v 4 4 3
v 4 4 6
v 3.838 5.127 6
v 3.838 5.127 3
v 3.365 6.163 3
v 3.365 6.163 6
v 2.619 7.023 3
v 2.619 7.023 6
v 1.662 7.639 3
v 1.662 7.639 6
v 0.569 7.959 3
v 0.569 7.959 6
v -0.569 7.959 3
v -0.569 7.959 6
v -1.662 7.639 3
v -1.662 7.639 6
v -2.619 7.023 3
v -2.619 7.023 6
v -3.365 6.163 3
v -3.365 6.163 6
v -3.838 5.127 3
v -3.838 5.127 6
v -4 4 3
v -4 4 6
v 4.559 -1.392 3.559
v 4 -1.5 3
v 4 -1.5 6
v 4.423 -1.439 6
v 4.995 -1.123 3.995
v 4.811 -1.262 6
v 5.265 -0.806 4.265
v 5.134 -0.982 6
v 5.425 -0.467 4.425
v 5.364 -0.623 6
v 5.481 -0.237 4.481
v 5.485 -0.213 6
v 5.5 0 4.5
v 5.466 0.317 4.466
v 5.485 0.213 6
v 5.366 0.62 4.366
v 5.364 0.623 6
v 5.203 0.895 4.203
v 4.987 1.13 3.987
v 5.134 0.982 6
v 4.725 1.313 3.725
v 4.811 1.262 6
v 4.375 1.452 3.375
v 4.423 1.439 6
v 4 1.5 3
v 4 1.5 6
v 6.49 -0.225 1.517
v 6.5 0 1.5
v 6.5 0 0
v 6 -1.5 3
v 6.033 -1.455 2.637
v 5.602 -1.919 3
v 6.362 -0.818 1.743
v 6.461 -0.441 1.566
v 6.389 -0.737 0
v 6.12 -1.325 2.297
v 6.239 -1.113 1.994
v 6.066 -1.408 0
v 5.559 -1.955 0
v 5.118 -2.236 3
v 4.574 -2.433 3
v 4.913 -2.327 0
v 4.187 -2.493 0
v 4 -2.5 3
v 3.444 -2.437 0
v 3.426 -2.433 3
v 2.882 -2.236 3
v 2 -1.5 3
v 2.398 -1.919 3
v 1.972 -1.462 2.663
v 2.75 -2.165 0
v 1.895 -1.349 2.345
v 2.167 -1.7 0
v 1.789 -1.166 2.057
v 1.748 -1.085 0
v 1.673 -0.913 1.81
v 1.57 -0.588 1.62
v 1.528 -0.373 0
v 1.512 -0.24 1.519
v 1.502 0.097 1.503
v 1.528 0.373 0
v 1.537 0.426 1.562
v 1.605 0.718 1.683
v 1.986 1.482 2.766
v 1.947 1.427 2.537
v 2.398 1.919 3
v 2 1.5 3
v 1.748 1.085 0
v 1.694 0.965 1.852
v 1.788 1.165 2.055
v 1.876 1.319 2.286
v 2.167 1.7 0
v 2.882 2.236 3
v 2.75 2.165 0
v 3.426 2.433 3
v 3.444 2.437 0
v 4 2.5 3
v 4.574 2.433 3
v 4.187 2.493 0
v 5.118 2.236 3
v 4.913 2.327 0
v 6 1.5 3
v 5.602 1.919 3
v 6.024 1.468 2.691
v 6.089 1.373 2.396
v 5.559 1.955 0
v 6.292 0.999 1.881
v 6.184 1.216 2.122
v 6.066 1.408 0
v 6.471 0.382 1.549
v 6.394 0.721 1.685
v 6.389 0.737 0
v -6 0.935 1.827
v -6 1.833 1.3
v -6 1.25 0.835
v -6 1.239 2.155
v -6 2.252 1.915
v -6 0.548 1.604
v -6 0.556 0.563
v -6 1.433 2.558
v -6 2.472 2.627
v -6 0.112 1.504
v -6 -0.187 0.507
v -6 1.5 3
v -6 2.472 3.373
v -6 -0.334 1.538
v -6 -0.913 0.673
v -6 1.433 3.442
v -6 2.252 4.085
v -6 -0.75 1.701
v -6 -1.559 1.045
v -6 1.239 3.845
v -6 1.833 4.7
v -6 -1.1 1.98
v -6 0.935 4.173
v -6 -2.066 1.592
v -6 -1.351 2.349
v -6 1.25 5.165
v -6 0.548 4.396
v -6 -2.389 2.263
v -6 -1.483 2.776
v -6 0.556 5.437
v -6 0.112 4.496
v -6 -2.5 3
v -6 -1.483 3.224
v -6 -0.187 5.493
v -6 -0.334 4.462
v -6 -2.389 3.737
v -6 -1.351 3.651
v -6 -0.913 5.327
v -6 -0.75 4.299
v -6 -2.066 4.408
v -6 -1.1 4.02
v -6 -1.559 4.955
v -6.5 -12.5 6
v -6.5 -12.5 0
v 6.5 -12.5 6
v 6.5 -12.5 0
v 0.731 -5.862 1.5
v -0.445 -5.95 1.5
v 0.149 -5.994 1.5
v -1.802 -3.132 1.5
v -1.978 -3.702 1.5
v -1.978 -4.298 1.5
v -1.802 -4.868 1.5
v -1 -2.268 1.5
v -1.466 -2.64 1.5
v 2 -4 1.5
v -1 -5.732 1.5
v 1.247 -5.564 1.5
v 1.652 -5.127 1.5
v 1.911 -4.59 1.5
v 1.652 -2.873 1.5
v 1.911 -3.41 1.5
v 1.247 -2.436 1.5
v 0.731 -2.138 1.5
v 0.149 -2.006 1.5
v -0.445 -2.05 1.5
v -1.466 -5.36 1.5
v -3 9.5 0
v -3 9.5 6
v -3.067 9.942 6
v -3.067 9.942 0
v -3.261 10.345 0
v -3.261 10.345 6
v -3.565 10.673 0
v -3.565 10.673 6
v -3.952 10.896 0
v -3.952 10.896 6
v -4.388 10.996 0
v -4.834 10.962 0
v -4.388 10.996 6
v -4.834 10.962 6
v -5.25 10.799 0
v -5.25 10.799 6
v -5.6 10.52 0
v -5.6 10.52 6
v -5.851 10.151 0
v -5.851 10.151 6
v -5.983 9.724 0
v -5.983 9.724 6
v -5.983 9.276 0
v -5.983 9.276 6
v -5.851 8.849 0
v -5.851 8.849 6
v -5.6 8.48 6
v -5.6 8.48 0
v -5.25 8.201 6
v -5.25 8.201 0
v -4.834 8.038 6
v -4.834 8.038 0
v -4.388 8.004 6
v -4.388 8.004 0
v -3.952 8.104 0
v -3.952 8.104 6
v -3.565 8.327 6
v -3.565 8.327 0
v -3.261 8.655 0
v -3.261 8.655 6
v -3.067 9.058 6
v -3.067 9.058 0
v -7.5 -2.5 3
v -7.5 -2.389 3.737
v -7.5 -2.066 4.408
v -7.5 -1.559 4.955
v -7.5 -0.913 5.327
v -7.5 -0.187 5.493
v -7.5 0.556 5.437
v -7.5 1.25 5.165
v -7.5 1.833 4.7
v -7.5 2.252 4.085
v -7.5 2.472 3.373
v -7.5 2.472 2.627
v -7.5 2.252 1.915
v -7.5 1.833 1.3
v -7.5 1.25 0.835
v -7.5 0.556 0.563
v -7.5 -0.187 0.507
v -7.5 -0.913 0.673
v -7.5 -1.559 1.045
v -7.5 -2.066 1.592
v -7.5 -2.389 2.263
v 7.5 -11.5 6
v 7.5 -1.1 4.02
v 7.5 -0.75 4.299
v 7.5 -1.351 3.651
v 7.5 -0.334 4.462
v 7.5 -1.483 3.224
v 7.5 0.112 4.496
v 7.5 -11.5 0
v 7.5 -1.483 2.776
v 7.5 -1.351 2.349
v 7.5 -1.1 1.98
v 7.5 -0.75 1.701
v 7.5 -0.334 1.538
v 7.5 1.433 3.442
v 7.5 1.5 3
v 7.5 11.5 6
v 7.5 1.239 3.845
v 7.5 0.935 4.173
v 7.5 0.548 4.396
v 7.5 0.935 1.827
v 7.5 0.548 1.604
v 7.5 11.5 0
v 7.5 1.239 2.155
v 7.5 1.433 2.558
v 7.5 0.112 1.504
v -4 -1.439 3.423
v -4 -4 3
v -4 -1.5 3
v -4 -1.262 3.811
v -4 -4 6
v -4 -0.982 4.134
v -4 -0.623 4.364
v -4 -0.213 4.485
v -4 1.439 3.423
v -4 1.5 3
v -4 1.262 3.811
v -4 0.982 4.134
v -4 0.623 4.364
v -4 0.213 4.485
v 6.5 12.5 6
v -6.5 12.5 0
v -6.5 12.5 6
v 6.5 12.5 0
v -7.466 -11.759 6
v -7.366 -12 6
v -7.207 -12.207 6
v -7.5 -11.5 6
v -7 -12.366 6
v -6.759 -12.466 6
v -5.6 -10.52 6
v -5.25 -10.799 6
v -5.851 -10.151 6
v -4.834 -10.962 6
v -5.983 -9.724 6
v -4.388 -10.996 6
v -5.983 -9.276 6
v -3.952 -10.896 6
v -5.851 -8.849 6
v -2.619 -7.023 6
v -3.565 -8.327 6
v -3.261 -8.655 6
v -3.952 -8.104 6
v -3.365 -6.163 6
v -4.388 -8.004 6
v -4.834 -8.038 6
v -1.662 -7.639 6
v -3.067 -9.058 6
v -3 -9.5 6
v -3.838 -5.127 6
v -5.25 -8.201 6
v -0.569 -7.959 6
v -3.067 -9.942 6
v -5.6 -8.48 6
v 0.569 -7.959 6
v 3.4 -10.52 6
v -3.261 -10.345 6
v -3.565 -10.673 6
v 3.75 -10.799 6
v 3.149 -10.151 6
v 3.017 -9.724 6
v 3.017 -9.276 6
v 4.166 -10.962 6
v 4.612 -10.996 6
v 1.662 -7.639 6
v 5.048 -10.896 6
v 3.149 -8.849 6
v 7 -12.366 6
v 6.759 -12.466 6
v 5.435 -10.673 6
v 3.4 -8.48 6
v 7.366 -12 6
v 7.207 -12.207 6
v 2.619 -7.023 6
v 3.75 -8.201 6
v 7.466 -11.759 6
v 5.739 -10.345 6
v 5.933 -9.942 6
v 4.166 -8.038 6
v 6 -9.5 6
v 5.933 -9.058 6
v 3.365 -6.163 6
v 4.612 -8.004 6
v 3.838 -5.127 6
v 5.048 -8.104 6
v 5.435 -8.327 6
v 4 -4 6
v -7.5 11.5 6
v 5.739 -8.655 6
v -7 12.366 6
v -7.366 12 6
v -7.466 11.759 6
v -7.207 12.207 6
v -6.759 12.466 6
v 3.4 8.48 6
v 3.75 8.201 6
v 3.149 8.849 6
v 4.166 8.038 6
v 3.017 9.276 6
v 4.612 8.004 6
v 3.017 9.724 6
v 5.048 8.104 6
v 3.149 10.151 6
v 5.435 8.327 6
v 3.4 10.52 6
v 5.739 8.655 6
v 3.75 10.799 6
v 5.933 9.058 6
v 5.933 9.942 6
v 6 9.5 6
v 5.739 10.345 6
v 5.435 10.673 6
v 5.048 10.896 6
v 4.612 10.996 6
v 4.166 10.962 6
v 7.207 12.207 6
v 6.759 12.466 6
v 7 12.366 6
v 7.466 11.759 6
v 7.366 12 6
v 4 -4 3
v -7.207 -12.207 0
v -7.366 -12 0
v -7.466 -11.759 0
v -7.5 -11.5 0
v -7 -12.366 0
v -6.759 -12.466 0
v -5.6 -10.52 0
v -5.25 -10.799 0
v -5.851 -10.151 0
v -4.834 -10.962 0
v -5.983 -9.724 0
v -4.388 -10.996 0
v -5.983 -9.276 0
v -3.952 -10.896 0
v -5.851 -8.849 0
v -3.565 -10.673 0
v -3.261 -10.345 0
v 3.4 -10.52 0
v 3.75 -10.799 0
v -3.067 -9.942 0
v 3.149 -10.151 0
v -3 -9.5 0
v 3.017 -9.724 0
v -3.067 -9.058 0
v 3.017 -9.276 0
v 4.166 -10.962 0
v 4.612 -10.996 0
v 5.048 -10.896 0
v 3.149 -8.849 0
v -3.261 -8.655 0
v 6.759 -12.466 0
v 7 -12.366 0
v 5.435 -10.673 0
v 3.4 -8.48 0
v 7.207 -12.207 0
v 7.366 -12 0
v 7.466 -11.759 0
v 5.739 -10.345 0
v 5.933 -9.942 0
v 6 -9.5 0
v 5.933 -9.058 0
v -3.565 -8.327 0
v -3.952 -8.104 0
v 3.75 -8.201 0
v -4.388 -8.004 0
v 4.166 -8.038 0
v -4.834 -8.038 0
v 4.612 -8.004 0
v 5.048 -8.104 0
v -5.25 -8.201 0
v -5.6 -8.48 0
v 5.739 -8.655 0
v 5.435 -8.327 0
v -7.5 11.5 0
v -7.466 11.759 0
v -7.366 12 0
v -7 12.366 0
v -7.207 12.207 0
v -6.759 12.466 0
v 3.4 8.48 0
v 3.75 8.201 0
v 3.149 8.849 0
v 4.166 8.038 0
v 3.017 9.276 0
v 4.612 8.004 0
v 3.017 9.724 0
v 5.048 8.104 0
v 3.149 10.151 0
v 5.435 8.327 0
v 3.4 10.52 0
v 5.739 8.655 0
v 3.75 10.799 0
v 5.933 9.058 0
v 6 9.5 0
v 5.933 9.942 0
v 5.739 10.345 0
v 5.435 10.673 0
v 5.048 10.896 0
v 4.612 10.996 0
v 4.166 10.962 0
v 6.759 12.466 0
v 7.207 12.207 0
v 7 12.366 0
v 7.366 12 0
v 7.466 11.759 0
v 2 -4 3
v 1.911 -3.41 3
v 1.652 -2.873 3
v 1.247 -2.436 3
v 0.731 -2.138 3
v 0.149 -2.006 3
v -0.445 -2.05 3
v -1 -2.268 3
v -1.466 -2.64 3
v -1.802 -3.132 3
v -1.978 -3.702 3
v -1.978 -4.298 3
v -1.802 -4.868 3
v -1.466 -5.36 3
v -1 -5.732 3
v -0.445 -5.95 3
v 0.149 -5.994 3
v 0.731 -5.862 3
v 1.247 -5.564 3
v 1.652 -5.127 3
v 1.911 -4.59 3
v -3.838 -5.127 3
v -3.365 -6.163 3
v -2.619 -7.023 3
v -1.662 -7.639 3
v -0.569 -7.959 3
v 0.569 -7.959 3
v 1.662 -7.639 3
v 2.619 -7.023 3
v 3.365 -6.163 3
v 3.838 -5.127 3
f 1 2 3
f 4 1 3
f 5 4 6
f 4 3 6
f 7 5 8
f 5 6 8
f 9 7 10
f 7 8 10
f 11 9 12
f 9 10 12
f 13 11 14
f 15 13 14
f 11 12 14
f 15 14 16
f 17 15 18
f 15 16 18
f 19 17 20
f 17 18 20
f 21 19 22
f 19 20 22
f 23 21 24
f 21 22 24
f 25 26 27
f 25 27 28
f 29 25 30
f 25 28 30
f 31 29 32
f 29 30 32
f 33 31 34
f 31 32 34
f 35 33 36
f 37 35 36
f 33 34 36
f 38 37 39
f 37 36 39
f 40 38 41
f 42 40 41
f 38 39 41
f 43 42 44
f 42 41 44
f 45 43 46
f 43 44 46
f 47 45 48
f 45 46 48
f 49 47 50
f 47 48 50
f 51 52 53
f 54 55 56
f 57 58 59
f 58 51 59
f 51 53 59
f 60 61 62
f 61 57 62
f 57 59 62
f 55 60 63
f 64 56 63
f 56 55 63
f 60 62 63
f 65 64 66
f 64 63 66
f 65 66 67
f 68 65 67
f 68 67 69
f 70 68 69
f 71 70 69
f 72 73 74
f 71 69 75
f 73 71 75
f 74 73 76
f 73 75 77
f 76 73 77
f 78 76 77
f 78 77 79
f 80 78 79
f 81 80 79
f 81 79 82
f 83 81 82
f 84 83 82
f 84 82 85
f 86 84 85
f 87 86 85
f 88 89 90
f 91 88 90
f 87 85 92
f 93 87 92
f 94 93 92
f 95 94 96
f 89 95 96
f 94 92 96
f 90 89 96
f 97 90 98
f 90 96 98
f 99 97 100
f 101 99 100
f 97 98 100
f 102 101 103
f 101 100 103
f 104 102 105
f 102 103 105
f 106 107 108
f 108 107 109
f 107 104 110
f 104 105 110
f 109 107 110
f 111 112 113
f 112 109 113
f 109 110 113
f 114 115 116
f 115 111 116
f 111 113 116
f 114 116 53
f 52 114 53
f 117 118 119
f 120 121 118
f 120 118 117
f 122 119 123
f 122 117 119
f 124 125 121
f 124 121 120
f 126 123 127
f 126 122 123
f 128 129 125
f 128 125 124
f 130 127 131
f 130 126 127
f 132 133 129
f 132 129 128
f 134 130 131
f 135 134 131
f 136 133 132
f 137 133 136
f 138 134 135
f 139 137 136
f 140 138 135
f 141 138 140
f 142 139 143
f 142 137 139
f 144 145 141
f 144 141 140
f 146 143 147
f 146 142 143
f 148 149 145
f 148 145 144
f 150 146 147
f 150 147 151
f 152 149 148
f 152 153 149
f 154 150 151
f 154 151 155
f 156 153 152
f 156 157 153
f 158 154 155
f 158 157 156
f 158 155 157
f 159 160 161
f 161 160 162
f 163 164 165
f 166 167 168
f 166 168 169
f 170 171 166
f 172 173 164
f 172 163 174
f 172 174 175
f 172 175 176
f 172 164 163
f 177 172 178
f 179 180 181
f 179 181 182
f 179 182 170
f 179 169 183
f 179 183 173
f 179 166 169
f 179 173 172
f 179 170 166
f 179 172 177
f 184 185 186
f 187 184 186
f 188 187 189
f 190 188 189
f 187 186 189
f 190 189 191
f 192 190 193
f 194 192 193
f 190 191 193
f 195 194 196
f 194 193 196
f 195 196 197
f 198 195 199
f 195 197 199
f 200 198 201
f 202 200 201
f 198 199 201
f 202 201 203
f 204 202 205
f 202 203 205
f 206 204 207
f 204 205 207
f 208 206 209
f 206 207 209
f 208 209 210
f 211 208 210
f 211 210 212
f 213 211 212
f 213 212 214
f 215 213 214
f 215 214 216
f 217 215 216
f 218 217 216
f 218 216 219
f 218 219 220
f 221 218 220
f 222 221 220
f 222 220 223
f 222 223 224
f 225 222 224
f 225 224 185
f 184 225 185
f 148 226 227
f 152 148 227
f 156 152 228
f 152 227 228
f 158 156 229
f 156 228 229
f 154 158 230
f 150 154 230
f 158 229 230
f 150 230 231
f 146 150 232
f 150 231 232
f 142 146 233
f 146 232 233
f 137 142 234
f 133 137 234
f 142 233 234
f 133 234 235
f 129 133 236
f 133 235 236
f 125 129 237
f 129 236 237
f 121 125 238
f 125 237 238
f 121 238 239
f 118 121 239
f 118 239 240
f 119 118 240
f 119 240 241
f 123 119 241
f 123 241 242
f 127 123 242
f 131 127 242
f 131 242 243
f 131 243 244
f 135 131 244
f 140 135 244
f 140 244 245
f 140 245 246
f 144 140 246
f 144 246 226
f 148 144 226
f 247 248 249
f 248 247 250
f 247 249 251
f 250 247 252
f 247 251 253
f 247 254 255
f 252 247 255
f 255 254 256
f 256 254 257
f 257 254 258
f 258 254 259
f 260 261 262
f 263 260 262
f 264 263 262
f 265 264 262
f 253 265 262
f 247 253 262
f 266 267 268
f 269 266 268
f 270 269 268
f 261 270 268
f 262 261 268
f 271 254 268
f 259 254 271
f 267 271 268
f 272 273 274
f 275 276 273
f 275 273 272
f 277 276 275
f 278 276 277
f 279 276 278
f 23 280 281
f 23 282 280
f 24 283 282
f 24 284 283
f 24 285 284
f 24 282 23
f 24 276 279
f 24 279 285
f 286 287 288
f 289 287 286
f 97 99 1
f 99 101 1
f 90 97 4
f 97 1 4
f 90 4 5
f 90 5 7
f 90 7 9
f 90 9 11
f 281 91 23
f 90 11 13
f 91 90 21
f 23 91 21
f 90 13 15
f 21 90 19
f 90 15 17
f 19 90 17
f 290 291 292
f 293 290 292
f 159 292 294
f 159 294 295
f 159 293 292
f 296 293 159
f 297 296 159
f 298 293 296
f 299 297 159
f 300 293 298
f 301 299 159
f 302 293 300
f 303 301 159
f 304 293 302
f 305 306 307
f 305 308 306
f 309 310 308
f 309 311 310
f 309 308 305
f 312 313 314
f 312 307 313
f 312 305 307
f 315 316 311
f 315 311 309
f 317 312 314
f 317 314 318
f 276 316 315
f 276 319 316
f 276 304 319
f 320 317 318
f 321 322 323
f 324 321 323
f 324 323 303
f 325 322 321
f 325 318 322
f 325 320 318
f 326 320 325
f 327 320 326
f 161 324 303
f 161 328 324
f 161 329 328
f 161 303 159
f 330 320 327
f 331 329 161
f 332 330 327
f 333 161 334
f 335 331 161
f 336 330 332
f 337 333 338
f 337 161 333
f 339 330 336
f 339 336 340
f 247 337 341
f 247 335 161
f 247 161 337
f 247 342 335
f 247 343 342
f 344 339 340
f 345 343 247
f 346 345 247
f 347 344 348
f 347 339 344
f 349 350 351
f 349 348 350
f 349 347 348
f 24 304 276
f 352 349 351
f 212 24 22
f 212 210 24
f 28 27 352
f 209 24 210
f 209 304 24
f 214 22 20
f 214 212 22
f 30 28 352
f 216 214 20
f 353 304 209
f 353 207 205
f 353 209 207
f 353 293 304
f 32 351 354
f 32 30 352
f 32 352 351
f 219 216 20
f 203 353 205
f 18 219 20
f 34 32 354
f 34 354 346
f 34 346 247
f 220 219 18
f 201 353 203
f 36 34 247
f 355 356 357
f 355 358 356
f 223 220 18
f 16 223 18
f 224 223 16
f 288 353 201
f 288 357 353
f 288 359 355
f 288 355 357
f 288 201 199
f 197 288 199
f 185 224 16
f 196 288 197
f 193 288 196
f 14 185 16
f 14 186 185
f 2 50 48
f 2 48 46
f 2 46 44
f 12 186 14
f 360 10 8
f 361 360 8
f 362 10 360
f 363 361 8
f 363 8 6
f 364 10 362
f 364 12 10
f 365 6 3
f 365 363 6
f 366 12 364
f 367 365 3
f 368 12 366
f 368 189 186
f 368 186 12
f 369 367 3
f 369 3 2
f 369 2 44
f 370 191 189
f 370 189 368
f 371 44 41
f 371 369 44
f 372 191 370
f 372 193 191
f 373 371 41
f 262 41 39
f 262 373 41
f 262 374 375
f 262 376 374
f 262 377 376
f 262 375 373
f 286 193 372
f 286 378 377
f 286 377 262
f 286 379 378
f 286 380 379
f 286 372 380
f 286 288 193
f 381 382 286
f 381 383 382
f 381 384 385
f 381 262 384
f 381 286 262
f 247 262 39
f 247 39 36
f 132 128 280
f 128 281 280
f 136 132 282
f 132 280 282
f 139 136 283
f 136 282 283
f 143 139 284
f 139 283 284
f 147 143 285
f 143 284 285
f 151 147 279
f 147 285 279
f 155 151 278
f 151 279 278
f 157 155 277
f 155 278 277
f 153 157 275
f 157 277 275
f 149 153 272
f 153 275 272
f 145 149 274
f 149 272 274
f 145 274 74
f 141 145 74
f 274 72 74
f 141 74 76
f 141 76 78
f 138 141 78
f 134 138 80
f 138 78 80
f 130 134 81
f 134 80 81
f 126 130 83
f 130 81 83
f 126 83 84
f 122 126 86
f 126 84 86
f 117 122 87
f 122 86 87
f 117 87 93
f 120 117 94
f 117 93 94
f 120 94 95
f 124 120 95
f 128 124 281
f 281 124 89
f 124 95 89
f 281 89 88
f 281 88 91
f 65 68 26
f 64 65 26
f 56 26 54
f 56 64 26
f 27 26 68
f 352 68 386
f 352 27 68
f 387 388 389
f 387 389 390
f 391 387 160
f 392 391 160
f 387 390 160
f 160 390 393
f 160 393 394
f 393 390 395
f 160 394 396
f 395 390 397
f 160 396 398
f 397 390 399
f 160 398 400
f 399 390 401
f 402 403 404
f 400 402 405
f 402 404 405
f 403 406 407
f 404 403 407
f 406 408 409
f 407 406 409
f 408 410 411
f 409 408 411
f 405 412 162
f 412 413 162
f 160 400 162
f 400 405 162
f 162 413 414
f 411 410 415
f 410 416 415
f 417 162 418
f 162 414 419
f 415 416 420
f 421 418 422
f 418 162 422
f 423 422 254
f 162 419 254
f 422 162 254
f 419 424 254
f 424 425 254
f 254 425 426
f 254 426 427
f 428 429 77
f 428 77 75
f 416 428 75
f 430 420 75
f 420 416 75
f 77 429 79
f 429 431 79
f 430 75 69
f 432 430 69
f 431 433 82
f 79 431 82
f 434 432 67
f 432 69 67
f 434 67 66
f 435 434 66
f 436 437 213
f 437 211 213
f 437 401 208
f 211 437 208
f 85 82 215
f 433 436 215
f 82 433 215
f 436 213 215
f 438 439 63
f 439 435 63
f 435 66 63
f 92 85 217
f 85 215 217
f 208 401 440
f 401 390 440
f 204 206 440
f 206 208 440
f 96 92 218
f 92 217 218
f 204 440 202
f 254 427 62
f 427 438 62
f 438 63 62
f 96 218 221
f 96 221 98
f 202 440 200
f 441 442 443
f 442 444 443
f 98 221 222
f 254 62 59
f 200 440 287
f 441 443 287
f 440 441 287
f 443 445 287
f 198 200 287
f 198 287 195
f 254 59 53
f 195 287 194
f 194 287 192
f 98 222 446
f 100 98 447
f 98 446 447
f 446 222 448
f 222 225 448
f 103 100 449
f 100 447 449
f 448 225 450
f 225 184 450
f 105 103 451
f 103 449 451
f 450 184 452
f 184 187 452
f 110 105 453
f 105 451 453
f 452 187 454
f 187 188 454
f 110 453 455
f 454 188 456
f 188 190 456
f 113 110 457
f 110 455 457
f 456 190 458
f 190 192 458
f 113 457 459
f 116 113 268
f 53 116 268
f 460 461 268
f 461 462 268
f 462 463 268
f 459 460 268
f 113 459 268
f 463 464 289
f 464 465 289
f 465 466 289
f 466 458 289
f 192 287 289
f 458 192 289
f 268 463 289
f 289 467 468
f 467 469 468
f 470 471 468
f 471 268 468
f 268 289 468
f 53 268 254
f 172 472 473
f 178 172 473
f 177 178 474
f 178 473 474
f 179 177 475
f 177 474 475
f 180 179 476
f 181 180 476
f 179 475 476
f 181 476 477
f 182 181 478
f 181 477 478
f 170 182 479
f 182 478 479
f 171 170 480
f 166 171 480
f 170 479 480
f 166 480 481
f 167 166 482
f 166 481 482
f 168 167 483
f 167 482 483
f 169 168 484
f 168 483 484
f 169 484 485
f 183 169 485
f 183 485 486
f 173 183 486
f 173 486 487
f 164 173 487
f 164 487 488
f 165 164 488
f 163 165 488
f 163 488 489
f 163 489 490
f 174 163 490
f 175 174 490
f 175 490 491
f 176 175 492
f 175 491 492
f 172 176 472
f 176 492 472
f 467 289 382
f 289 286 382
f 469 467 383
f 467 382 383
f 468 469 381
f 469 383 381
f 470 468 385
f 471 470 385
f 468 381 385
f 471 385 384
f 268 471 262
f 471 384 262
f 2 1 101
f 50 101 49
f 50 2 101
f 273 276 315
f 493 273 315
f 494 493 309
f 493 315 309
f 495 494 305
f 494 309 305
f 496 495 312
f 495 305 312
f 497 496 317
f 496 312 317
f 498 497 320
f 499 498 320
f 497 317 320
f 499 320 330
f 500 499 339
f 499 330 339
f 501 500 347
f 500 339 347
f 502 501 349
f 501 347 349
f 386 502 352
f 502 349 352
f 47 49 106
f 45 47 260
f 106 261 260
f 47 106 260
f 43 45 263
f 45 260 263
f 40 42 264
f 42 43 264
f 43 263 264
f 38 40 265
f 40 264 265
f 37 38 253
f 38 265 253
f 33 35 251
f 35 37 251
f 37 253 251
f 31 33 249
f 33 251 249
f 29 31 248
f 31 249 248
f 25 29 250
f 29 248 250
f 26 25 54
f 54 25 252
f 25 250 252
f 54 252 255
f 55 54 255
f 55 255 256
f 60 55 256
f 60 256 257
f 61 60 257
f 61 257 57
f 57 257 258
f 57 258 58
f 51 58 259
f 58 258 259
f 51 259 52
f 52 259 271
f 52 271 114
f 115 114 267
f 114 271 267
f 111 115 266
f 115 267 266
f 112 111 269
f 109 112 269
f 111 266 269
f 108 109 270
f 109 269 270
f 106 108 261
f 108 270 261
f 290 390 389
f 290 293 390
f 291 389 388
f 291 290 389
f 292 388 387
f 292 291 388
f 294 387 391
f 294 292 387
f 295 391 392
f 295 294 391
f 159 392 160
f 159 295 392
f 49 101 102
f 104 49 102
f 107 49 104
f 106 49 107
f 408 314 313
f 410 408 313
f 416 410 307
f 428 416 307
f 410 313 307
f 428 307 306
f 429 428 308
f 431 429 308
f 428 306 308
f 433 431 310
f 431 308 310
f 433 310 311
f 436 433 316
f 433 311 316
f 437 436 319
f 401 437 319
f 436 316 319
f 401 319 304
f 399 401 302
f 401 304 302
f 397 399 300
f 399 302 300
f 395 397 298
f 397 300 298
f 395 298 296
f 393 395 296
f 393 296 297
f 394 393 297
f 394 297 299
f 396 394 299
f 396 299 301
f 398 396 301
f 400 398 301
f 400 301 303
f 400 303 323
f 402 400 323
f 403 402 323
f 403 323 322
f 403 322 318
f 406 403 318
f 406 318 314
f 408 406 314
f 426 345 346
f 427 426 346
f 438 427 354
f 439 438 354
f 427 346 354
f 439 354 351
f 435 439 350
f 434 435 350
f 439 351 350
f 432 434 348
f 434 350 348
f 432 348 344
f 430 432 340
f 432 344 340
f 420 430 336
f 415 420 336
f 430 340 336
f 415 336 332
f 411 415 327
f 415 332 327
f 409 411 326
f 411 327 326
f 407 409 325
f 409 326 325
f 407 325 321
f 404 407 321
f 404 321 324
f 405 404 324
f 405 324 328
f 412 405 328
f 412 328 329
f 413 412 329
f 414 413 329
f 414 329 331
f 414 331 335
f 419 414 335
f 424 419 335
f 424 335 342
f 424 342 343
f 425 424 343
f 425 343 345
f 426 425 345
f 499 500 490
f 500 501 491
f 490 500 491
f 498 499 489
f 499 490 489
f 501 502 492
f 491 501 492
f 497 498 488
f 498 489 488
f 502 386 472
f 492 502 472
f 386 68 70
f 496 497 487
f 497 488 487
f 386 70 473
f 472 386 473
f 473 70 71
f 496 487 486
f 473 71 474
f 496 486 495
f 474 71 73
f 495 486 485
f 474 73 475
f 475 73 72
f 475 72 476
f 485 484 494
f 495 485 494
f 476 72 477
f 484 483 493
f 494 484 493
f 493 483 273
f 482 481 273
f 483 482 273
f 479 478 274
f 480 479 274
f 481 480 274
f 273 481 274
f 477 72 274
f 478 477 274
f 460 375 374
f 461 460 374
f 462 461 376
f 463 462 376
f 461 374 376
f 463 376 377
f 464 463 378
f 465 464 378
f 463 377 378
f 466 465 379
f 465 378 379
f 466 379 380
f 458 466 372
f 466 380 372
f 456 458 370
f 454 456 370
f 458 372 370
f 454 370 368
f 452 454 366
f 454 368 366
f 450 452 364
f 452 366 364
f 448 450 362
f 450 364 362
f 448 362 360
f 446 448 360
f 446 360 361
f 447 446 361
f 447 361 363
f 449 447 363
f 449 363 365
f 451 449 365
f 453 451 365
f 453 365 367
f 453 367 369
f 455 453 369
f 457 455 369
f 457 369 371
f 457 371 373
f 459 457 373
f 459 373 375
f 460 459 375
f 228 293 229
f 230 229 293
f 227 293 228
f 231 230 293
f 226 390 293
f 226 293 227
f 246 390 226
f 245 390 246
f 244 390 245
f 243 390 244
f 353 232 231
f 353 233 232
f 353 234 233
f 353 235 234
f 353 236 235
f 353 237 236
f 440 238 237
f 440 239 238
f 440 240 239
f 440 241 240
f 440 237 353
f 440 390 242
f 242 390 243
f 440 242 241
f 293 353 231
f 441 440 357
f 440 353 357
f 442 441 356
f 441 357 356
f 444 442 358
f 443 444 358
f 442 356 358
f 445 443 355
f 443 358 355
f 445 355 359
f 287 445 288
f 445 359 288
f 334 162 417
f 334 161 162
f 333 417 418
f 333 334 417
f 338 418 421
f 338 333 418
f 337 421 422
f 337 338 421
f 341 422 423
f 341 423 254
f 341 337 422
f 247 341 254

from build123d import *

# Parameters (mm, degrees)
SKETCH_W                        = 15
SKETCH_H                        = 25
PAD_DEPTH                       = 6
POCKET_DEPTH                    = 3
SKETCH002_R                     = 2.5
POCKET001_DEPTH                 = 3
SKETCH003_R                     = 1.5
POCKET002_DEPTH                 = 6.001
SKETCH004_R                     = 2
POCKET003_DEPTH                 = 1.5
SKETCH005_R                     = 1.5
POCKET004_DEPTH                 = 65.532504
SKETCH005_LINEARPATTERN_2_R     = 1.5
POCKET004_LINEARPATTERN_2_DEPTH = 65.532504
LINEARPATTERN001_COUNT          = 2
LINEARPATTERN001_PITCH          = 19
HOLE_D                          = 3
HOLE_DEPTH                      = 25
HOLE_CBORE_D                    = 5
HOLE_CBORE_DEPTH                = 1.5
FILLET_R                        = 1


with BuildPart() as part:
    # Sketch → Pad (new body)
    with BuildSketch(Plane.XY):
        Rectangle(SKETCH_W, SKETCH_H)
    extrude(amount=PAD_DEPTH)

    # Sketch001 (on Face6 of Pad) → Pocket (cut)
    with BuildSketch(Plane.XY.offset(6)):
        with BuildLine():
            Line((4, 4), (4, -4))
            ThreePointArc((-4, -4), (0, -8), (4, -4))
            Line((-4, -4), (-4, 4))
            ThreePointArc((4, 4), (0, 8), (-4, 4))
        make_face()
    extrude(amount=-POCKET_DEPTH, mode=Mode.SUBTRACT)

    # Sketch002 (on Face4 of Pocket) → Pocket001 (cut)
    with BuildSketch(Plane(origin=(0, 0, 0), x_dir=(1, 0, 0), z_dir=(0, 0, -1))):
        with Locations((4, 0)):
            Circle(SKETCH002_R)
    extrude(amount=-POCKET001_DEPTH, mode=Mode.SUBTRACT)

    # Sketch003 (on Face5 of Pocket001) → Pocket002 (cut, through all)
    with BuildSketch(Plane.XY.offset(6)):
        with Locations((4, 0)):
            Circle(SKETCH003_R)
    extrude(amount=-POCKET002_DEPTH, mode=Mode.SUBTRACT)

    # Sketch004 (on Face14 of Pocket002) → Pocket003 (cut)
    with BuildSketch(Plane.XY.offset(3)):
        with Locations((0, -4)):
            Circle(SKETCH004_R)
    extrude(amount=-POCKET003_DEPTH, mode=Mode.SUBTRACT)

    # Sketch005 (on Face5 of Pocket003) → Pocket004 (cut, through all)
    with BuildSketch(Plane.XY.offset(6)):
        with Locations((-4.5, 9.5)):
            Circle(SKETCH005_R)
    pocket004 = extrude(amount=-POCKET004_DEPTH, mode=Mode.SUBTRACT)

    # Sketch005 LinearPattern 2 → Pocket004 LinearPattern 2 (cut, through all)
    with BuildSketch(Plane(origin=(9, 0, 6), x_dir=(1, 0, 0), z_dir=(0, 0, 1))):
        with Locations((-4.5, 9.5)):
            Circle(SKETCH005_LINEARPATTERN_2_R)
    pocket004_linearpattern_2 = extrude(amount=-POCKET004_LINEARPATTERN_2_DEPTH, mode=Mode.SUBTRACT)

    # LinearPattern001: Pocket004, Pocket004 LinearPattern 2 ×2
    with Locations(*[(0, -i * LINEARPATTERN001_PITCH, 0) for i in range(1, LINEARPATTERN001_COUNT)]):
        add(pocket004, mode=Mode.SUBTRACT)
        add(pocket004_linearpattern_2, mode=Mode.SUBTRACT)

    # Hole
    with Locations(Plane(origin=(-7.5, 0, 0), x_dir=(0, -1, 0), z_dir=(-1, 0, 0))):
        with Locations((0, 3)):
            CounterBoreHole(HOLE_D / 2, HOLE_CBORE_D / 2, HOLE_CBORE_DEPTH, depth=HOLE_DEPTH)

    # Fillet
    fillet_edges = [part.edges().sort_by_distance(p)[0] for p in [
        (-7.5, -12.5, 3),
        (7.5, -12.5, 3),
        (-7.5, 12.5, 3),
        (7.5, 12.5, 3),
    ]]
    fillet(fillet_edges, radius=FILLET_R)


solid = part.part
